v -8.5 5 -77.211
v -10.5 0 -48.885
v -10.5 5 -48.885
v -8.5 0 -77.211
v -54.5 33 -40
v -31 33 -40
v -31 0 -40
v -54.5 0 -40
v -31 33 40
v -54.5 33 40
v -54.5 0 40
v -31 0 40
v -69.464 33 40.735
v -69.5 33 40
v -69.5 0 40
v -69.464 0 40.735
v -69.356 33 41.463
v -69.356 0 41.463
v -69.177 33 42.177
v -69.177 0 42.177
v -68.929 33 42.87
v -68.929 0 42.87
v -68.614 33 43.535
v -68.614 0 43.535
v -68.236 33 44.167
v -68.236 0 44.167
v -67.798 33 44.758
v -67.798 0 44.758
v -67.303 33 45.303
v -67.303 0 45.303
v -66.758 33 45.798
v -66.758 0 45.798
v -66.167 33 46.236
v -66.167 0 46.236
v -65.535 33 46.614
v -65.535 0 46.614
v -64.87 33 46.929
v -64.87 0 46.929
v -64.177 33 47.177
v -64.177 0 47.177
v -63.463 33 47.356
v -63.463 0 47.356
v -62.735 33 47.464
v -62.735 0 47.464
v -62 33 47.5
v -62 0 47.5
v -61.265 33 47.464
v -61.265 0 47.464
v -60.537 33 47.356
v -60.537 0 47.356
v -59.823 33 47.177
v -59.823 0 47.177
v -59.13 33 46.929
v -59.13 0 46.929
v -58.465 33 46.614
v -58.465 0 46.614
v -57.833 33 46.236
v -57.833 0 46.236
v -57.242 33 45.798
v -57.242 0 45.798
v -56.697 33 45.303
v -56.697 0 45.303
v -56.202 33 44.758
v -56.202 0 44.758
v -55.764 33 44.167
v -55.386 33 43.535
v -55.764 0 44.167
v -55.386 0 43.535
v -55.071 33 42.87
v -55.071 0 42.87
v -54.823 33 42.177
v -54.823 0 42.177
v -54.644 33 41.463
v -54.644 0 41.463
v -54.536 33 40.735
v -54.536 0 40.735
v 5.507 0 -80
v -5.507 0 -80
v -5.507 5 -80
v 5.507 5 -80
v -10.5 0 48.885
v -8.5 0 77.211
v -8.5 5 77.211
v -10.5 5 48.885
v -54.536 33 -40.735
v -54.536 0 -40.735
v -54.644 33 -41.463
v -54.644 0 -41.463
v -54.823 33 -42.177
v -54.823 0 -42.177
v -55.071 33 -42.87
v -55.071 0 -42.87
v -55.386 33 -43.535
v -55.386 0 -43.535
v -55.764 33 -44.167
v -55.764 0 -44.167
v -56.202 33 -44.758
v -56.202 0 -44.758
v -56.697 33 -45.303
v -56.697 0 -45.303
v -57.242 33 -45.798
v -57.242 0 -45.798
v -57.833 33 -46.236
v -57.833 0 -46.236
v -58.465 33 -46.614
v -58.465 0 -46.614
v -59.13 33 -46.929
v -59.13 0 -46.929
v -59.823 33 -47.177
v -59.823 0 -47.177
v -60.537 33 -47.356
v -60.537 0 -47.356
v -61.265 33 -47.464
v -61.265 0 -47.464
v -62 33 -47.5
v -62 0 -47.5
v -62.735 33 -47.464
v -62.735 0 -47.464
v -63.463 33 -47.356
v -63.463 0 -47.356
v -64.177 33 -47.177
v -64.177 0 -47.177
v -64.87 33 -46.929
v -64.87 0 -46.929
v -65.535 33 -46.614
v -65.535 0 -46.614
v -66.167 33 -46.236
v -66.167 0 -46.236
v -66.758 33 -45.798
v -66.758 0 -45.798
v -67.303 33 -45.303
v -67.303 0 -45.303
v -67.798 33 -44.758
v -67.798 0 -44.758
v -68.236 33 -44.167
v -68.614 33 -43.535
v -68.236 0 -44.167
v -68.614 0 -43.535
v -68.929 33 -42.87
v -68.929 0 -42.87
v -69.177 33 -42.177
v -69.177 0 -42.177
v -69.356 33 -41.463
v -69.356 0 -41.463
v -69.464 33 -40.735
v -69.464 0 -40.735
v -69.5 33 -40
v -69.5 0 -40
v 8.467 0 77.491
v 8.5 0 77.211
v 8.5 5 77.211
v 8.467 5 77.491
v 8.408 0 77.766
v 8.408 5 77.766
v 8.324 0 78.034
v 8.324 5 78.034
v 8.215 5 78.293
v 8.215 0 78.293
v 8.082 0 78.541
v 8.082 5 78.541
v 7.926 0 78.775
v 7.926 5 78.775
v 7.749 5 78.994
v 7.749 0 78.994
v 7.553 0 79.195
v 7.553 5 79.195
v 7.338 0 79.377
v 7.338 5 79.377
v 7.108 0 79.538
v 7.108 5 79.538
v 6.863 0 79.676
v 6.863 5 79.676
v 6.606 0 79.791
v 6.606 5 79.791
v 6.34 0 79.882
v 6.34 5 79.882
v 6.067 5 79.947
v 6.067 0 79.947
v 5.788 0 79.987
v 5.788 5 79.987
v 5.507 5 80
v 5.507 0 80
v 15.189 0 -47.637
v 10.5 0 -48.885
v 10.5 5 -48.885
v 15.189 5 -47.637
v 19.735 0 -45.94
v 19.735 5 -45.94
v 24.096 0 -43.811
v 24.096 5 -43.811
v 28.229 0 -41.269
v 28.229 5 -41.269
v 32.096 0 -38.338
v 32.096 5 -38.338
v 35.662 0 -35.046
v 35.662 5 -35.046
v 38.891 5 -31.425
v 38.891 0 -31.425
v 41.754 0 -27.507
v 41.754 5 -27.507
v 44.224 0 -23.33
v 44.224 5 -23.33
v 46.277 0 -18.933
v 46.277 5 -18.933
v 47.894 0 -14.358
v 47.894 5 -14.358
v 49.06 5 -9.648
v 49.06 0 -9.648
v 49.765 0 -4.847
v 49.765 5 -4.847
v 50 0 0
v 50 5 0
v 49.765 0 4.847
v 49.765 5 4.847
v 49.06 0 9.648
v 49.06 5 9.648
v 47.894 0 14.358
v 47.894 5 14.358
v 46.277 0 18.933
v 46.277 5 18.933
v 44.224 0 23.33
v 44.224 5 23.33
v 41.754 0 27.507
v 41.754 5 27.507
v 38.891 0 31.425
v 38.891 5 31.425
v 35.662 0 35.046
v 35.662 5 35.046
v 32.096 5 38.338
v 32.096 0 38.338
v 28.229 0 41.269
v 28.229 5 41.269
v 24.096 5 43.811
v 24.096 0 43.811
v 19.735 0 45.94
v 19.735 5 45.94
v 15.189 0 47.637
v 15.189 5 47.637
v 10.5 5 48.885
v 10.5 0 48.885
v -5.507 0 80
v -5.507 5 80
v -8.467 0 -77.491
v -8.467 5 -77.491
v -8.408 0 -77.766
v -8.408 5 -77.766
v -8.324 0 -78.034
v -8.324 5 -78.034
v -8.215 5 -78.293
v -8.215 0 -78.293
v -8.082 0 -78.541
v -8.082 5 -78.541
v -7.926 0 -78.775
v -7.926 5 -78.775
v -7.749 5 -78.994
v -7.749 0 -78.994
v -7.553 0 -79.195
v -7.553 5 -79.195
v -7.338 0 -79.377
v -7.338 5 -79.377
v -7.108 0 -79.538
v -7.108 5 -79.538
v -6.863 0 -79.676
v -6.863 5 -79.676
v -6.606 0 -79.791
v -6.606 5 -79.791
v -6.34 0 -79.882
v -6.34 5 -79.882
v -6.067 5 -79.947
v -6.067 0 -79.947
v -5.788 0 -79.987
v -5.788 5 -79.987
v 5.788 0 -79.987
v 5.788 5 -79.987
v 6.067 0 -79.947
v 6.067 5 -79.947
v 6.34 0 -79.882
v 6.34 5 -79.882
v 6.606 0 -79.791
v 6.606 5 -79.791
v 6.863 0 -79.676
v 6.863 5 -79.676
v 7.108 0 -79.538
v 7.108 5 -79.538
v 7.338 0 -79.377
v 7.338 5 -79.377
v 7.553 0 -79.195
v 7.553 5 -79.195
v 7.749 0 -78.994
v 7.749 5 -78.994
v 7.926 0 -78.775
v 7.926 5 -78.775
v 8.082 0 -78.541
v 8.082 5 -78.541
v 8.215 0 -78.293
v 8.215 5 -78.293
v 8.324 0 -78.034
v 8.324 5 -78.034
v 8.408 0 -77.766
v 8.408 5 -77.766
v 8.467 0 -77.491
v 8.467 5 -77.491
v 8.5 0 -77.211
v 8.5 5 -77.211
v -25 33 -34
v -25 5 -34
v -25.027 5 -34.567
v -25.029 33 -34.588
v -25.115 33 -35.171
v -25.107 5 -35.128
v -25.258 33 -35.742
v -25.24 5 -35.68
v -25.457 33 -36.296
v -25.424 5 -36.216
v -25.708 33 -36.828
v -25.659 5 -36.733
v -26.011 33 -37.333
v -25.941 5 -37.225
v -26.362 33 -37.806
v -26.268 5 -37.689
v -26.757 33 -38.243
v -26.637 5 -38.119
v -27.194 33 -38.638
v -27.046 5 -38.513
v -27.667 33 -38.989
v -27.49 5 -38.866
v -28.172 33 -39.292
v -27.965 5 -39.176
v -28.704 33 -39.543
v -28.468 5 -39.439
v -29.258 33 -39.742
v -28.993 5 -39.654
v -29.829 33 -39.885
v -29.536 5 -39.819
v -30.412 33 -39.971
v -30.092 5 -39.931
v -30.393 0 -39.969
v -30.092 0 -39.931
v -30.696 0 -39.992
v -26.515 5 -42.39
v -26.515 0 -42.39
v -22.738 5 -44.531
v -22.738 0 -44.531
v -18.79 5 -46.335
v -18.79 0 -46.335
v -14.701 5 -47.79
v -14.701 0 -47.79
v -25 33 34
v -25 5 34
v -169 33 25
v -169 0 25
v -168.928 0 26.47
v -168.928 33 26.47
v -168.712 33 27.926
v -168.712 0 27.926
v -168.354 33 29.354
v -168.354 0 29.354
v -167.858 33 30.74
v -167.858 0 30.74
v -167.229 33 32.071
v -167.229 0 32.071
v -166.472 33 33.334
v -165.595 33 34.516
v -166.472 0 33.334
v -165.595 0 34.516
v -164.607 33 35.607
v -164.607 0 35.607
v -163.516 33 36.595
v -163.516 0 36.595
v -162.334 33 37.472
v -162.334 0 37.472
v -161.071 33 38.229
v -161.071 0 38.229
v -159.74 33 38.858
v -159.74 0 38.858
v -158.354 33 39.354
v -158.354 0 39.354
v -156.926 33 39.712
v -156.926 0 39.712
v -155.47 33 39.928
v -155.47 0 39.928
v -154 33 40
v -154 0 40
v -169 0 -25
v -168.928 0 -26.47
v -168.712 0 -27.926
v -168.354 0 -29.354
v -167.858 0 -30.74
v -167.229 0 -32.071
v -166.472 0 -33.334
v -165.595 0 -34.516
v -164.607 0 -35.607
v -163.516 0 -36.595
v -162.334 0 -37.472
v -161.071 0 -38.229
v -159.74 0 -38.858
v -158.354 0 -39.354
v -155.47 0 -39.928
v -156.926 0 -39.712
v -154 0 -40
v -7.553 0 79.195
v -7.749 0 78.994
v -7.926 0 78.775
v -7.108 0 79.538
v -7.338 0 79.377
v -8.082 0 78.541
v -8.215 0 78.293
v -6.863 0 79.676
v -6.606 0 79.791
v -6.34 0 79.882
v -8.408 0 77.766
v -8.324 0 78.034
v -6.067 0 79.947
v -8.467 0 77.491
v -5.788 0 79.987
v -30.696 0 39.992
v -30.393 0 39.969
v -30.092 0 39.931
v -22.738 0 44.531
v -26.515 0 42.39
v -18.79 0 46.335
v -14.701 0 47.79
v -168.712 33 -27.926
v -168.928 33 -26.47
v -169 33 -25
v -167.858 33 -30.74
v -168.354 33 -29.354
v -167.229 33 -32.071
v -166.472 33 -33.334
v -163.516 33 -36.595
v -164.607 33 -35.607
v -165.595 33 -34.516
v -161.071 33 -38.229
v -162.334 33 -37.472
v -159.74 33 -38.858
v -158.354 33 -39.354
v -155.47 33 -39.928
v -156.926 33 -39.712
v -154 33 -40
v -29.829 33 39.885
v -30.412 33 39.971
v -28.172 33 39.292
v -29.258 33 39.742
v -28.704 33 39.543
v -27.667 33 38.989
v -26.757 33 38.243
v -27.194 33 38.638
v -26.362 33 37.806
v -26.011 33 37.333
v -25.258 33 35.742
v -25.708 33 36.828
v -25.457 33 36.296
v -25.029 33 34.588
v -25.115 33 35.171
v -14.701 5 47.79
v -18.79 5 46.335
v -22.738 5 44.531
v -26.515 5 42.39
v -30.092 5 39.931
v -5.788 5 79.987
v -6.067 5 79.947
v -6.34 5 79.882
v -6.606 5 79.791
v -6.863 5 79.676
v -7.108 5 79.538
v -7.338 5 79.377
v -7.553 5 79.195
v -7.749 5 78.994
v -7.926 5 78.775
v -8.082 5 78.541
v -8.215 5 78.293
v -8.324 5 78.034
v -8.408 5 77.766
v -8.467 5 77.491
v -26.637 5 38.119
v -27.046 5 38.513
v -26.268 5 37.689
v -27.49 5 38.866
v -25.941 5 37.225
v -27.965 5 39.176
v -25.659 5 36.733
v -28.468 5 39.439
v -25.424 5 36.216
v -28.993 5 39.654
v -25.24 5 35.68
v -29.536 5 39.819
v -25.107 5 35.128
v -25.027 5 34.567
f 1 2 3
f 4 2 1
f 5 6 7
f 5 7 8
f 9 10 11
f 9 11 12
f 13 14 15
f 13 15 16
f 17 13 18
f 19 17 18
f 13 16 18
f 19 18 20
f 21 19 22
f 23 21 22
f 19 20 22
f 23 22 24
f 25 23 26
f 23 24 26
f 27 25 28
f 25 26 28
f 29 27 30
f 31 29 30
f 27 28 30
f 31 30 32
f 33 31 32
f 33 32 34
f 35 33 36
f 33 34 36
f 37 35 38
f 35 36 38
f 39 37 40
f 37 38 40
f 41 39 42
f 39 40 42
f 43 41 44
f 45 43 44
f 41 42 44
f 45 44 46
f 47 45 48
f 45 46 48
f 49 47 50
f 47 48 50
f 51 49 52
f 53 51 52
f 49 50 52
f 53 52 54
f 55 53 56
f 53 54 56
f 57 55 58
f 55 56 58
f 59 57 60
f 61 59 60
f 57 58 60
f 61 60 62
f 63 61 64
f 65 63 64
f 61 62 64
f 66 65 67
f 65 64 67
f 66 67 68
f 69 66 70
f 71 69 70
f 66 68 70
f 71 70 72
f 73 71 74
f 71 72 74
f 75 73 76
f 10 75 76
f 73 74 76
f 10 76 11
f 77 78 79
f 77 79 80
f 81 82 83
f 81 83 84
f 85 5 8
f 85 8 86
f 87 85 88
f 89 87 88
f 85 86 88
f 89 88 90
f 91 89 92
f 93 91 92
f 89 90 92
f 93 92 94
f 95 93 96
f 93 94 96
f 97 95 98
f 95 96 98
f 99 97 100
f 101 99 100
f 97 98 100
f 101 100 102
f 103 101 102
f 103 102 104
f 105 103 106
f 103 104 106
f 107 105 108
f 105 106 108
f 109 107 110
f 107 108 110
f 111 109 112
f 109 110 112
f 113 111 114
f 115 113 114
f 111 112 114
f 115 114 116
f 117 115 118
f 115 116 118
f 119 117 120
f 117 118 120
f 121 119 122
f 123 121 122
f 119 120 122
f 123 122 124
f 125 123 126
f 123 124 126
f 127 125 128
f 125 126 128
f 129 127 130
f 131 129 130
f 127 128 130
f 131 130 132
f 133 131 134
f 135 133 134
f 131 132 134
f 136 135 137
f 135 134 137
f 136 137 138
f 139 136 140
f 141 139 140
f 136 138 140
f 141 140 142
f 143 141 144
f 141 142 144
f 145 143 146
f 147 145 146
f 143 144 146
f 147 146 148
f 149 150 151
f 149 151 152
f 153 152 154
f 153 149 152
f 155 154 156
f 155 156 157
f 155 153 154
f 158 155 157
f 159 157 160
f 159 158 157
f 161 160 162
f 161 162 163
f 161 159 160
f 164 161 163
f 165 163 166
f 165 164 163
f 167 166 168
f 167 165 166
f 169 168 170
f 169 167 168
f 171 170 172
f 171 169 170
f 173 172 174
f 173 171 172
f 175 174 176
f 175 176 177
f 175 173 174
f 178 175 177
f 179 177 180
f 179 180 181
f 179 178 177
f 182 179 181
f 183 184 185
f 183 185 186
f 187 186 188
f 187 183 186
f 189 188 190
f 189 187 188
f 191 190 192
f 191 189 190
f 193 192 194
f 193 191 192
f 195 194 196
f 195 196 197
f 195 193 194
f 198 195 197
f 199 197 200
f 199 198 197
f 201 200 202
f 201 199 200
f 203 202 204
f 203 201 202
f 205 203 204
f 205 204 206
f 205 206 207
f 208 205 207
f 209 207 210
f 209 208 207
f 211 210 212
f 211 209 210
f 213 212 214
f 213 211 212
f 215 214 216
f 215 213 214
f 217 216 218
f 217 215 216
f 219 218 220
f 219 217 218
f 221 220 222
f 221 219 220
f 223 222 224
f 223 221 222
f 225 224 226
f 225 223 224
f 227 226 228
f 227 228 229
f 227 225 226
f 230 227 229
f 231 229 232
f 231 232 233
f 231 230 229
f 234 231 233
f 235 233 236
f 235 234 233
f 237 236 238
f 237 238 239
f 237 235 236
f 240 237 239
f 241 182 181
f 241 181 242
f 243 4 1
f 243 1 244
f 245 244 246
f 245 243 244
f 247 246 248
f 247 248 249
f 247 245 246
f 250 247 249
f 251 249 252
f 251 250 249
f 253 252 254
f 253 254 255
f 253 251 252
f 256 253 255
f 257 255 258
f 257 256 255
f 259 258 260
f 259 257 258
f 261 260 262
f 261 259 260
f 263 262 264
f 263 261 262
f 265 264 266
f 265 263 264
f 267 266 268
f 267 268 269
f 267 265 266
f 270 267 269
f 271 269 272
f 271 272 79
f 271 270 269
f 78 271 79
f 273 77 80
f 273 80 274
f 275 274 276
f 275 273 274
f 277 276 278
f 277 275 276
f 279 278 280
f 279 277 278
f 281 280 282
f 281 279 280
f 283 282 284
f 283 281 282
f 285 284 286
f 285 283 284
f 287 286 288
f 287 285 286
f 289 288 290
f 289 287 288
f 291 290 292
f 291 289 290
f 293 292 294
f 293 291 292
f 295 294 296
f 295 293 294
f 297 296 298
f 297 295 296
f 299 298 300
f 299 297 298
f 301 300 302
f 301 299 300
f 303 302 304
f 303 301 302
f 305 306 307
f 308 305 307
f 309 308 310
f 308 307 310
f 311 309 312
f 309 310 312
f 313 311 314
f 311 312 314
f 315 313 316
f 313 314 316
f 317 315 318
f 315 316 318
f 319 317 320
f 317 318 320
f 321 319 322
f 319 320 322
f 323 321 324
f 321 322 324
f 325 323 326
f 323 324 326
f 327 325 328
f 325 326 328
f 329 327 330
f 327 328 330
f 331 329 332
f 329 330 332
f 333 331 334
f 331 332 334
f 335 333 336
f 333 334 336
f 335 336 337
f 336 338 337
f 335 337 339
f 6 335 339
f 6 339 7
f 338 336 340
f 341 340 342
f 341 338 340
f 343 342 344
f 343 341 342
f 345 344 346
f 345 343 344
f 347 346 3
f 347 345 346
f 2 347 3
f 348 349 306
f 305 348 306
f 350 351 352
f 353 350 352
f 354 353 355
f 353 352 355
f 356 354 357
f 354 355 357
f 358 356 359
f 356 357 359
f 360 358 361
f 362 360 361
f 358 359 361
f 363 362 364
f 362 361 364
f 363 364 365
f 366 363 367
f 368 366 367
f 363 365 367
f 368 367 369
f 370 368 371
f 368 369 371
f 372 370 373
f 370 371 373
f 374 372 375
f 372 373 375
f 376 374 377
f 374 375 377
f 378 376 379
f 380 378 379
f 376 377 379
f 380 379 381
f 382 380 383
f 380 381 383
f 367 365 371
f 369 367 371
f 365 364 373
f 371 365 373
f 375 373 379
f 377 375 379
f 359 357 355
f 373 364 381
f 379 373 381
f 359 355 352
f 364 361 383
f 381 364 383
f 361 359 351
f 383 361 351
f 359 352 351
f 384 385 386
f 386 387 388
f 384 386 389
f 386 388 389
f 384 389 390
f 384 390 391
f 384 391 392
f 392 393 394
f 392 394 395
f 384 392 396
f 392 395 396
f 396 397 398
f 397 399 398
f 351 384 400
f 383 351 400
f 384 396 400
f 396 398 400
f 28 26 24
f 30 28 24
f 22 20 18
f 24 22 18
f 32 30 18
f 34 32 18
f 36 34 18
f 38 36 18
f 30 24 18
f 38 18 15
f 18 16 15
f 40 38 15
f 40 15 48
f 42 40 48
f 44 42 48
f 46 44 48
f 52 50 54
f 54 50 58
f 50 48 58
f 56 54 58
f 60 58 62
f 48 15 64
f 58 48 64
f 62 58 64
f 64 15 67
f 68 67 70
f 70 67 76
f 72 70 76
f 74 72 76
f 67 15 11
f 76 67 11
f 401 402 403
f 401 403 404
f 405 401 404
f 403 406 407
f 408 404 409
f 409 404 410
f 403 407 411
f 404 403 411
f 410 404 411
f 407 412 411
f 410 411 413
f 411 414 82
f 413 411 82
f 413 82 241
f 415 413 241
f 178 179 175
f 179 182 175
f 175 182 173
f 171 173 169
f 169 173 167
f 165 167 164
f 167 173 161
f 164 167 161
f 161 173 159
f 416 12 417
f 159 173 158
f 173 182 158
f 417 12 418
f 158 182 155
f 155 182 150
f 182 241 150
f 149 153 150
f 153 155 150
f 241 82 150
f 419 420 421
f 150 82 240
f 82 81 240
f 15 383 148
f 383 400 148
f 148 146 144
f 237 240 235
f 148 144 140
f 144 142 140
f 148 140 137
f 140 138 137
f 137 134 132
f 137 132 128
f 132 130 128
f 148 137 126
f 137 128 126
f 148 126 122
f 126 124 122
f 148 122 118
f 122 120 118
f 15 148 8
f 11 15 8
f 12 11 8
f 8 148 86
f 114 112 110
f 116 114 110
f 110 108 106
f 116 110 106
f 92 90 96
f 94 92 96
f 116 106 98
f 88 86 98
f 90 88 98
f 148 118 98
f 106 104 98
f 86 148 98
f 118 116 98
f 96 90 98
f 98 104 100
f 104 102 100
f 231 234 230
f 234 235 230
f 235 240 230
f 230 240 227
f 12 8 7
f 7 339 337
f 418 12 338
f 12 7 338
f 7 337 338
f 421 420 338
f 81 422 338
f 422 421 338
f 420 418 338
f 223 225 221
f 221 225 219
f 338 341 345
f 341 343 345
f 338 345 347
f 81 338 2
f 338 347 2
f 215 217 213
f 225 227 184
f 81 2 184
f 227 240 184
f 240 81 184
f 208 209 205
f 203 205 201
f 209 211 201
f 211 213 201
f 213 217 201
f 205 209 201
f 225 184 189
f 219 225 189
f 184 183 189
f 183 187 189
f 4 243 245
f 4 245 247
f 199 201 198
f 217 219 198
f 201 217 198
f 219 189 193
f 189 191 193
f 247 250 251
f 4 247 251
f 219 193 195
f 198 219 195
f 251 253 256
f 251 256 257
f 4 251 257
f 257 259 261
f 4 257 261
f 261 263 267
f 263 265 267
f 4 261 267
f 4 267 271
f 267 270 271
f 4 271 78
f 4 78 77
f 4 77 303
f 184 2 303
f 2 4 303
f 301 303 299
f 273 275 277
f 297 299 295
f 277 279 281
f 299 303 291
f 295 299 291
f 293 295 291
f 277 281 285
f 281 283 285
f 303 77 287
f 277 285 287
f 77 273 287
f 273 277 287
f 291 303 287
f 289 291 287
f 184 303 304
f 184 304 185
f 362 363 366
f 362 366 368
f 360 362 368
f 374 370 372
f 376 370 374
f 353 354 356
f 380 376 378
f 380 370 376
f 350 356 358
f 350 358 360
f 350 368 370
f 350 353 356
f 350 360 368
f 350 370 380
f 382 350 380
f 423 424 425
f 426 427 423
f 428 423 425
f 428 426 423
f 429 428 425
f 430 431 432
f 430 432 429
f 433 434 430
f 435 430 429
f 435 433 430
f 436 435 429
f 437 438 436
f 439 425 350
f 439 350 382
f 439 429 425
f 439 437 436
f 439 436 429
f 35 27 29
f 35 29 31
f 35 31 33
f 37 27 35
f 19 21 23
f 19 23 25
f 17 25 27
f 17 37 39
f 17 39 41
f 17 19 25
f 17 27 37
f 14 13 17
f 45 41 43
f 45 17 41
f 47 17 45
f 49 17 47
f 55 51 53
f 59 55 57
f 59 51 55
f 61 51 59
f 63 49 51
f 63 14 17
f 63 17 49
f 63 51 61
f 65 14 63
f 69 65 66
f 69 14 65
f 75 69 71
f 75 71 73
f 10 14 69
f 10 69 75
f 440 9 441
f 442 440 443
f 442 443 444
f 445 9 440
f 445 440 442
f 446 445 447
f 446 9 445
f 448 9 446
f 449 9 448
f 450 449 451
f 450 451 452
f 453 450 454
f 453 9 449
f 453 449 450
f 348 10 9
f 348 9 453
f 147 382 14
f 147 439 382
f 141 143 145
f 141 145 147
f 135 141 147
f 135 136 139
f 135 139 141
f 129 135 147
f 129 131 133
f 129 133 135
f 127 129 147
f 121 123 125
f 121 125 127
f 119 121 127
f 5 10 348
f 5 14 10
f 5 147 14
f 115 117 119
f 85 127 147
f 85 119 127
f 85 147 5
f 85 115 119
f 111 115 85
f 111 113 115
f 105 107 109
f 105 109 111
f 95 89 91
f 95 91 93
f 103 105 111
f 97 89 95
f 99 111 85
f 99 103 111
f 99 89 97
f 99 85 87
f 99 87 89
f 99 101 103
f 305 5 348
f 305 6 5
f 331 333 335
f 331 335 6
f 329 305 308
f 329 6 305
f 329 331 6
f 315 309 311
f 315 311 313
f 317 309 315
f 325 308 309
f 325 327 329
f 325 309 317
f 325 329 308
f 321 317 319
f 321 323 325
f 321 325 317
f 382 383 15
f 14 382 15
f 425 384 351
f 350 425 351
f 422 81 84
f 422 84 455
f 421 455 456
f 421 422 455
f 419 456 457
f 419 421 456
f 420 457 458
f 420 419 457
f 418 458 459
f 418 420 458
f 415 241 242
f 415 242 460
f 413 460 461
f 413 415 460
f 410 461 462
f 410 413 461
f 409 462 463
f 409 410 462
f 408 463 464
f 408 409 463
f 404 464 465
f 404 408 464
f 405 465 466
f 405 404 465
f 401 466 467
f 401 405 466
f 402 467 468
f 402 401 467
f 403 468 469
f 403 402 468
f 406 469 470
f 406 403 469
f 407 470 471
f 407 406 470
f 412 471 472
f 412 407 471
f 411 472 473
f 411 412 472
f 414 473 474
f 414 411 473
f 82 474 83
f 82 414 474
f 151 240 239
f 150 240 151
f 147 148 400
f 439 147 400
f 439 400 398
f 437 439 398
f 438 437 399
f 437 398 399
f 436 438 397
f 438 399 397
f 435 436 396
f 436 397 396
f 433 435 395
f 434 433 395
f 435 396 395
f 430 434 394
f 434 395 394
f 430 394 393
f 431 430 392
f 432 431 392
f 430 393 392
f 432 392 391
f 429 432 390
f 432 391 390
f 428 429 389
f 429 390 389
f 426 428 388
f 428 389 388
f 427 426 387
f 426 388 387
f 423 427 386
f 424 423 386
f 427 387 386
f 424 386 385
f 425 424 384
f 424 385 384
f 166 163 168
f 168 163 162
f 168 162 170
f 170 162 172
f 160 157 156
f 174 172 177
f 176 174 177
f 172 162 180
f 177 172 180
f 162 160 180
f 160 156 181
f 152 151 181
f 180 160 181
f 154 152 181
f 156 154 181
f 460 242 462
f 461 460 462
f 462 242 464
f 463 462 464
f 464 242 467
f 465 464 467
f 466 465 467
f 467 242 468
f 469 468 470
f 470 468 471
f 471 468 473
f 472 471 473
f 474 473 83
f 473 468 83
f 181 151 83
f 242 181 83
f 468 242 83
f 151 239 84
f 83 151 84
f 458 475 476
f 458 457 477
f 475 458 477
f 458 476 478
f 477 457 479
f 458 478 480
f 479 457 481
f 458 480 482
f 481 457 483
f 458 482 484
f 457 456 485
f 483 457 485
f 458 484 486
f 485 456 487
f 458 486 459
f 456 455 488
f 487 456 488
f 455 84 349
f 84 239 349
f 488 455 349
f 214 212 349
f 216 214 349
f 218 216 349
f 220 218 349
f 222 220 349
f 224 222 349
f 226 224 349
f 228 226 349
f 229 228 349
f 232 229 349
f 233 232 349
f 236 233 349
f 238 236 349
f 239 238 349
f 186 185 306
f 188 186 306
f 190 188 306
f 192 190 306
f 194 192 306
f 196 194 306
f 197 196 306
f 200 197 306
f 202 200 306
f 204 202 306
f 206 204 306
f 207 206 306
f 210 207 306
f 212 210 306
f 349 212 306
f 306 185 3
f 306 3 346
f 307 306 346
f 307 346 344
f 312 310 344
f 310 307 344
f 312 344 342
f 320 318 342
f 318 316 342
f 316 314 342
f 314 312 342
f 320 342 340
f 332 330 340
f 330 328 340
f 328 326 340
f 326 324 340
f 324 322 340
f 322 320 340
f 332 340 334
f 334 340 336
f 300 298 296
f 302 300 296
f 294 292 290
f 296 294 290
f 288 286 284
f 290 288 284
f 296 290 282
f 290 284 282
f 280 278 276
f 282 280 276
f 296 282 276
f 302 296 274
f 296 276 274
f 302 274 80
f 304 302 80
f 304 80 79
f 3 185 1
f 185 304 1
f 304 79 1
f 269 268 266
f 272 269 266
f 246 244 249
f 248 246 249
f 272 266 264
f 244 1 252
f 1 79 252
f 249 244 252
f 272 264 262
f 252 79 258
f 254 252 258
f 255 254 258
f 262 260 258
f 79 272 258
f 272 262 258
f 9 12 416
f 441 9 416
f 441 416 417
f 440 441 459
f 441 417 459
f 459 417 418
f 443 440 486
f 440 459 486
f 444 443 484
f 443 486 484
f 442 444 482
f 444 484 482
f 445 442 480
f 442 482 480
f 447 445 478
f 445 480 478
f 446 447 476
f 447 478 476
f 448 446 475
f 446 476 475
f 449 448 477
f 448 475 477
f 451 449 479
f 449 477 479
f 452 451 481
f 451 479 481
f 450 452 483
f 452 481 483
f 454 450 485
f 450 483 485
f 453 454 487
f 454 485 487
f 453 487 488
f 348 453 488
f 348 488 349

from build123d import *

# Parameters (mm, degrees)
BOSS_EXTRUDE1_DEPTH = 5
BOSS_EXTRUDE2_DEPTH = 33


with BuildPart() as part:
    # Sketch1 → Boss-Extrude1 (new body)
    with BuildSketch(Plane(origin=(0, 0, 0), x_dir=(1, 0, 0), z_dir=(0, 1, 0))):
        with BuildLine():
            Line((-10.5, 48.885069295), (-8.5, 77.211291854))
            ThreePointArc((-8.5, 77.211291854), (-7.552703541, 79.194752328), (-5.507449958, 80))
            Line((-5.507449958, 80), (5.507449958, 80))
            ThreePointArc((5.507449958, 80), (7.552703541, 79.194752328), (8.5, 77.211291854))
            Line((8.5, 77.211291854), (10.5, 48.885069295))
            ThreePointArc((10.5, 48.885069295), (50, 0), (10.5, -48.885069295))
            Line((10.5, -48.885069295), (8.5, -77.211291854))
            ThreePointArc((8.5, -77.211291854), (7.552703541, -79.194752328), (5.507449958, -80))
            Line((5.507449958, -80), (-5.507449958, -80))
            ThreePointArc((-5.507449958, -80), (-7.552703541, -79.194752328), (-8.5, -77.211291854))
            Line((-8.5, -77.211291854), (-10.5, -48.885069295))
            ThreePointArc((-10.5, -48.885069295), (-50, 0), (-10.5, 48.885069295))
        make_face()
    extrude(amount=BOSS_EXTRUDE1_DEPTH)

    # Sketch2 → Boss-Extrude2 (add)
    with BuildSketch(Plane(origin=(0, 0, 0), x_dir=(1, 0, 0), z_dir=(0, 1, 0))):
        with BuildLine():
            Line((-154, -40), (-69.5, -40))
            ThreePointArc((-69.5, -40), (-62, -47.5), (-54.5, -40))
            Line((-54.5, -40), (-31, -40))
            ThreePointArc((-31, -40), (-26.757359313, -38.242640687), (-25, -34))
            Line((-25, -34), (-25, 34))
            ThreePointArc((-25, 34), (-26.757359313, 38.242640687), (-31, 40))
            Line((-31, 40), (-54.5, 40))
            ThreePointArc((-54.5, 40), (-62, 47.5), (-69.5, 40))
            Line((-69.5, 40), (-154, 40))
            ThreePointArc((-154, 40), (-164.606601718, 35.606601718), (-169, 25))
            Line((-169, 25), (-169, -25))
            ThreePointArc((-169, -25), (-164.606601718, -35.606601718), (-154, -40))
        make_face()
    extrude(amount=BOSS_EXTRUDE2_DEPTH)


solid = part.part
